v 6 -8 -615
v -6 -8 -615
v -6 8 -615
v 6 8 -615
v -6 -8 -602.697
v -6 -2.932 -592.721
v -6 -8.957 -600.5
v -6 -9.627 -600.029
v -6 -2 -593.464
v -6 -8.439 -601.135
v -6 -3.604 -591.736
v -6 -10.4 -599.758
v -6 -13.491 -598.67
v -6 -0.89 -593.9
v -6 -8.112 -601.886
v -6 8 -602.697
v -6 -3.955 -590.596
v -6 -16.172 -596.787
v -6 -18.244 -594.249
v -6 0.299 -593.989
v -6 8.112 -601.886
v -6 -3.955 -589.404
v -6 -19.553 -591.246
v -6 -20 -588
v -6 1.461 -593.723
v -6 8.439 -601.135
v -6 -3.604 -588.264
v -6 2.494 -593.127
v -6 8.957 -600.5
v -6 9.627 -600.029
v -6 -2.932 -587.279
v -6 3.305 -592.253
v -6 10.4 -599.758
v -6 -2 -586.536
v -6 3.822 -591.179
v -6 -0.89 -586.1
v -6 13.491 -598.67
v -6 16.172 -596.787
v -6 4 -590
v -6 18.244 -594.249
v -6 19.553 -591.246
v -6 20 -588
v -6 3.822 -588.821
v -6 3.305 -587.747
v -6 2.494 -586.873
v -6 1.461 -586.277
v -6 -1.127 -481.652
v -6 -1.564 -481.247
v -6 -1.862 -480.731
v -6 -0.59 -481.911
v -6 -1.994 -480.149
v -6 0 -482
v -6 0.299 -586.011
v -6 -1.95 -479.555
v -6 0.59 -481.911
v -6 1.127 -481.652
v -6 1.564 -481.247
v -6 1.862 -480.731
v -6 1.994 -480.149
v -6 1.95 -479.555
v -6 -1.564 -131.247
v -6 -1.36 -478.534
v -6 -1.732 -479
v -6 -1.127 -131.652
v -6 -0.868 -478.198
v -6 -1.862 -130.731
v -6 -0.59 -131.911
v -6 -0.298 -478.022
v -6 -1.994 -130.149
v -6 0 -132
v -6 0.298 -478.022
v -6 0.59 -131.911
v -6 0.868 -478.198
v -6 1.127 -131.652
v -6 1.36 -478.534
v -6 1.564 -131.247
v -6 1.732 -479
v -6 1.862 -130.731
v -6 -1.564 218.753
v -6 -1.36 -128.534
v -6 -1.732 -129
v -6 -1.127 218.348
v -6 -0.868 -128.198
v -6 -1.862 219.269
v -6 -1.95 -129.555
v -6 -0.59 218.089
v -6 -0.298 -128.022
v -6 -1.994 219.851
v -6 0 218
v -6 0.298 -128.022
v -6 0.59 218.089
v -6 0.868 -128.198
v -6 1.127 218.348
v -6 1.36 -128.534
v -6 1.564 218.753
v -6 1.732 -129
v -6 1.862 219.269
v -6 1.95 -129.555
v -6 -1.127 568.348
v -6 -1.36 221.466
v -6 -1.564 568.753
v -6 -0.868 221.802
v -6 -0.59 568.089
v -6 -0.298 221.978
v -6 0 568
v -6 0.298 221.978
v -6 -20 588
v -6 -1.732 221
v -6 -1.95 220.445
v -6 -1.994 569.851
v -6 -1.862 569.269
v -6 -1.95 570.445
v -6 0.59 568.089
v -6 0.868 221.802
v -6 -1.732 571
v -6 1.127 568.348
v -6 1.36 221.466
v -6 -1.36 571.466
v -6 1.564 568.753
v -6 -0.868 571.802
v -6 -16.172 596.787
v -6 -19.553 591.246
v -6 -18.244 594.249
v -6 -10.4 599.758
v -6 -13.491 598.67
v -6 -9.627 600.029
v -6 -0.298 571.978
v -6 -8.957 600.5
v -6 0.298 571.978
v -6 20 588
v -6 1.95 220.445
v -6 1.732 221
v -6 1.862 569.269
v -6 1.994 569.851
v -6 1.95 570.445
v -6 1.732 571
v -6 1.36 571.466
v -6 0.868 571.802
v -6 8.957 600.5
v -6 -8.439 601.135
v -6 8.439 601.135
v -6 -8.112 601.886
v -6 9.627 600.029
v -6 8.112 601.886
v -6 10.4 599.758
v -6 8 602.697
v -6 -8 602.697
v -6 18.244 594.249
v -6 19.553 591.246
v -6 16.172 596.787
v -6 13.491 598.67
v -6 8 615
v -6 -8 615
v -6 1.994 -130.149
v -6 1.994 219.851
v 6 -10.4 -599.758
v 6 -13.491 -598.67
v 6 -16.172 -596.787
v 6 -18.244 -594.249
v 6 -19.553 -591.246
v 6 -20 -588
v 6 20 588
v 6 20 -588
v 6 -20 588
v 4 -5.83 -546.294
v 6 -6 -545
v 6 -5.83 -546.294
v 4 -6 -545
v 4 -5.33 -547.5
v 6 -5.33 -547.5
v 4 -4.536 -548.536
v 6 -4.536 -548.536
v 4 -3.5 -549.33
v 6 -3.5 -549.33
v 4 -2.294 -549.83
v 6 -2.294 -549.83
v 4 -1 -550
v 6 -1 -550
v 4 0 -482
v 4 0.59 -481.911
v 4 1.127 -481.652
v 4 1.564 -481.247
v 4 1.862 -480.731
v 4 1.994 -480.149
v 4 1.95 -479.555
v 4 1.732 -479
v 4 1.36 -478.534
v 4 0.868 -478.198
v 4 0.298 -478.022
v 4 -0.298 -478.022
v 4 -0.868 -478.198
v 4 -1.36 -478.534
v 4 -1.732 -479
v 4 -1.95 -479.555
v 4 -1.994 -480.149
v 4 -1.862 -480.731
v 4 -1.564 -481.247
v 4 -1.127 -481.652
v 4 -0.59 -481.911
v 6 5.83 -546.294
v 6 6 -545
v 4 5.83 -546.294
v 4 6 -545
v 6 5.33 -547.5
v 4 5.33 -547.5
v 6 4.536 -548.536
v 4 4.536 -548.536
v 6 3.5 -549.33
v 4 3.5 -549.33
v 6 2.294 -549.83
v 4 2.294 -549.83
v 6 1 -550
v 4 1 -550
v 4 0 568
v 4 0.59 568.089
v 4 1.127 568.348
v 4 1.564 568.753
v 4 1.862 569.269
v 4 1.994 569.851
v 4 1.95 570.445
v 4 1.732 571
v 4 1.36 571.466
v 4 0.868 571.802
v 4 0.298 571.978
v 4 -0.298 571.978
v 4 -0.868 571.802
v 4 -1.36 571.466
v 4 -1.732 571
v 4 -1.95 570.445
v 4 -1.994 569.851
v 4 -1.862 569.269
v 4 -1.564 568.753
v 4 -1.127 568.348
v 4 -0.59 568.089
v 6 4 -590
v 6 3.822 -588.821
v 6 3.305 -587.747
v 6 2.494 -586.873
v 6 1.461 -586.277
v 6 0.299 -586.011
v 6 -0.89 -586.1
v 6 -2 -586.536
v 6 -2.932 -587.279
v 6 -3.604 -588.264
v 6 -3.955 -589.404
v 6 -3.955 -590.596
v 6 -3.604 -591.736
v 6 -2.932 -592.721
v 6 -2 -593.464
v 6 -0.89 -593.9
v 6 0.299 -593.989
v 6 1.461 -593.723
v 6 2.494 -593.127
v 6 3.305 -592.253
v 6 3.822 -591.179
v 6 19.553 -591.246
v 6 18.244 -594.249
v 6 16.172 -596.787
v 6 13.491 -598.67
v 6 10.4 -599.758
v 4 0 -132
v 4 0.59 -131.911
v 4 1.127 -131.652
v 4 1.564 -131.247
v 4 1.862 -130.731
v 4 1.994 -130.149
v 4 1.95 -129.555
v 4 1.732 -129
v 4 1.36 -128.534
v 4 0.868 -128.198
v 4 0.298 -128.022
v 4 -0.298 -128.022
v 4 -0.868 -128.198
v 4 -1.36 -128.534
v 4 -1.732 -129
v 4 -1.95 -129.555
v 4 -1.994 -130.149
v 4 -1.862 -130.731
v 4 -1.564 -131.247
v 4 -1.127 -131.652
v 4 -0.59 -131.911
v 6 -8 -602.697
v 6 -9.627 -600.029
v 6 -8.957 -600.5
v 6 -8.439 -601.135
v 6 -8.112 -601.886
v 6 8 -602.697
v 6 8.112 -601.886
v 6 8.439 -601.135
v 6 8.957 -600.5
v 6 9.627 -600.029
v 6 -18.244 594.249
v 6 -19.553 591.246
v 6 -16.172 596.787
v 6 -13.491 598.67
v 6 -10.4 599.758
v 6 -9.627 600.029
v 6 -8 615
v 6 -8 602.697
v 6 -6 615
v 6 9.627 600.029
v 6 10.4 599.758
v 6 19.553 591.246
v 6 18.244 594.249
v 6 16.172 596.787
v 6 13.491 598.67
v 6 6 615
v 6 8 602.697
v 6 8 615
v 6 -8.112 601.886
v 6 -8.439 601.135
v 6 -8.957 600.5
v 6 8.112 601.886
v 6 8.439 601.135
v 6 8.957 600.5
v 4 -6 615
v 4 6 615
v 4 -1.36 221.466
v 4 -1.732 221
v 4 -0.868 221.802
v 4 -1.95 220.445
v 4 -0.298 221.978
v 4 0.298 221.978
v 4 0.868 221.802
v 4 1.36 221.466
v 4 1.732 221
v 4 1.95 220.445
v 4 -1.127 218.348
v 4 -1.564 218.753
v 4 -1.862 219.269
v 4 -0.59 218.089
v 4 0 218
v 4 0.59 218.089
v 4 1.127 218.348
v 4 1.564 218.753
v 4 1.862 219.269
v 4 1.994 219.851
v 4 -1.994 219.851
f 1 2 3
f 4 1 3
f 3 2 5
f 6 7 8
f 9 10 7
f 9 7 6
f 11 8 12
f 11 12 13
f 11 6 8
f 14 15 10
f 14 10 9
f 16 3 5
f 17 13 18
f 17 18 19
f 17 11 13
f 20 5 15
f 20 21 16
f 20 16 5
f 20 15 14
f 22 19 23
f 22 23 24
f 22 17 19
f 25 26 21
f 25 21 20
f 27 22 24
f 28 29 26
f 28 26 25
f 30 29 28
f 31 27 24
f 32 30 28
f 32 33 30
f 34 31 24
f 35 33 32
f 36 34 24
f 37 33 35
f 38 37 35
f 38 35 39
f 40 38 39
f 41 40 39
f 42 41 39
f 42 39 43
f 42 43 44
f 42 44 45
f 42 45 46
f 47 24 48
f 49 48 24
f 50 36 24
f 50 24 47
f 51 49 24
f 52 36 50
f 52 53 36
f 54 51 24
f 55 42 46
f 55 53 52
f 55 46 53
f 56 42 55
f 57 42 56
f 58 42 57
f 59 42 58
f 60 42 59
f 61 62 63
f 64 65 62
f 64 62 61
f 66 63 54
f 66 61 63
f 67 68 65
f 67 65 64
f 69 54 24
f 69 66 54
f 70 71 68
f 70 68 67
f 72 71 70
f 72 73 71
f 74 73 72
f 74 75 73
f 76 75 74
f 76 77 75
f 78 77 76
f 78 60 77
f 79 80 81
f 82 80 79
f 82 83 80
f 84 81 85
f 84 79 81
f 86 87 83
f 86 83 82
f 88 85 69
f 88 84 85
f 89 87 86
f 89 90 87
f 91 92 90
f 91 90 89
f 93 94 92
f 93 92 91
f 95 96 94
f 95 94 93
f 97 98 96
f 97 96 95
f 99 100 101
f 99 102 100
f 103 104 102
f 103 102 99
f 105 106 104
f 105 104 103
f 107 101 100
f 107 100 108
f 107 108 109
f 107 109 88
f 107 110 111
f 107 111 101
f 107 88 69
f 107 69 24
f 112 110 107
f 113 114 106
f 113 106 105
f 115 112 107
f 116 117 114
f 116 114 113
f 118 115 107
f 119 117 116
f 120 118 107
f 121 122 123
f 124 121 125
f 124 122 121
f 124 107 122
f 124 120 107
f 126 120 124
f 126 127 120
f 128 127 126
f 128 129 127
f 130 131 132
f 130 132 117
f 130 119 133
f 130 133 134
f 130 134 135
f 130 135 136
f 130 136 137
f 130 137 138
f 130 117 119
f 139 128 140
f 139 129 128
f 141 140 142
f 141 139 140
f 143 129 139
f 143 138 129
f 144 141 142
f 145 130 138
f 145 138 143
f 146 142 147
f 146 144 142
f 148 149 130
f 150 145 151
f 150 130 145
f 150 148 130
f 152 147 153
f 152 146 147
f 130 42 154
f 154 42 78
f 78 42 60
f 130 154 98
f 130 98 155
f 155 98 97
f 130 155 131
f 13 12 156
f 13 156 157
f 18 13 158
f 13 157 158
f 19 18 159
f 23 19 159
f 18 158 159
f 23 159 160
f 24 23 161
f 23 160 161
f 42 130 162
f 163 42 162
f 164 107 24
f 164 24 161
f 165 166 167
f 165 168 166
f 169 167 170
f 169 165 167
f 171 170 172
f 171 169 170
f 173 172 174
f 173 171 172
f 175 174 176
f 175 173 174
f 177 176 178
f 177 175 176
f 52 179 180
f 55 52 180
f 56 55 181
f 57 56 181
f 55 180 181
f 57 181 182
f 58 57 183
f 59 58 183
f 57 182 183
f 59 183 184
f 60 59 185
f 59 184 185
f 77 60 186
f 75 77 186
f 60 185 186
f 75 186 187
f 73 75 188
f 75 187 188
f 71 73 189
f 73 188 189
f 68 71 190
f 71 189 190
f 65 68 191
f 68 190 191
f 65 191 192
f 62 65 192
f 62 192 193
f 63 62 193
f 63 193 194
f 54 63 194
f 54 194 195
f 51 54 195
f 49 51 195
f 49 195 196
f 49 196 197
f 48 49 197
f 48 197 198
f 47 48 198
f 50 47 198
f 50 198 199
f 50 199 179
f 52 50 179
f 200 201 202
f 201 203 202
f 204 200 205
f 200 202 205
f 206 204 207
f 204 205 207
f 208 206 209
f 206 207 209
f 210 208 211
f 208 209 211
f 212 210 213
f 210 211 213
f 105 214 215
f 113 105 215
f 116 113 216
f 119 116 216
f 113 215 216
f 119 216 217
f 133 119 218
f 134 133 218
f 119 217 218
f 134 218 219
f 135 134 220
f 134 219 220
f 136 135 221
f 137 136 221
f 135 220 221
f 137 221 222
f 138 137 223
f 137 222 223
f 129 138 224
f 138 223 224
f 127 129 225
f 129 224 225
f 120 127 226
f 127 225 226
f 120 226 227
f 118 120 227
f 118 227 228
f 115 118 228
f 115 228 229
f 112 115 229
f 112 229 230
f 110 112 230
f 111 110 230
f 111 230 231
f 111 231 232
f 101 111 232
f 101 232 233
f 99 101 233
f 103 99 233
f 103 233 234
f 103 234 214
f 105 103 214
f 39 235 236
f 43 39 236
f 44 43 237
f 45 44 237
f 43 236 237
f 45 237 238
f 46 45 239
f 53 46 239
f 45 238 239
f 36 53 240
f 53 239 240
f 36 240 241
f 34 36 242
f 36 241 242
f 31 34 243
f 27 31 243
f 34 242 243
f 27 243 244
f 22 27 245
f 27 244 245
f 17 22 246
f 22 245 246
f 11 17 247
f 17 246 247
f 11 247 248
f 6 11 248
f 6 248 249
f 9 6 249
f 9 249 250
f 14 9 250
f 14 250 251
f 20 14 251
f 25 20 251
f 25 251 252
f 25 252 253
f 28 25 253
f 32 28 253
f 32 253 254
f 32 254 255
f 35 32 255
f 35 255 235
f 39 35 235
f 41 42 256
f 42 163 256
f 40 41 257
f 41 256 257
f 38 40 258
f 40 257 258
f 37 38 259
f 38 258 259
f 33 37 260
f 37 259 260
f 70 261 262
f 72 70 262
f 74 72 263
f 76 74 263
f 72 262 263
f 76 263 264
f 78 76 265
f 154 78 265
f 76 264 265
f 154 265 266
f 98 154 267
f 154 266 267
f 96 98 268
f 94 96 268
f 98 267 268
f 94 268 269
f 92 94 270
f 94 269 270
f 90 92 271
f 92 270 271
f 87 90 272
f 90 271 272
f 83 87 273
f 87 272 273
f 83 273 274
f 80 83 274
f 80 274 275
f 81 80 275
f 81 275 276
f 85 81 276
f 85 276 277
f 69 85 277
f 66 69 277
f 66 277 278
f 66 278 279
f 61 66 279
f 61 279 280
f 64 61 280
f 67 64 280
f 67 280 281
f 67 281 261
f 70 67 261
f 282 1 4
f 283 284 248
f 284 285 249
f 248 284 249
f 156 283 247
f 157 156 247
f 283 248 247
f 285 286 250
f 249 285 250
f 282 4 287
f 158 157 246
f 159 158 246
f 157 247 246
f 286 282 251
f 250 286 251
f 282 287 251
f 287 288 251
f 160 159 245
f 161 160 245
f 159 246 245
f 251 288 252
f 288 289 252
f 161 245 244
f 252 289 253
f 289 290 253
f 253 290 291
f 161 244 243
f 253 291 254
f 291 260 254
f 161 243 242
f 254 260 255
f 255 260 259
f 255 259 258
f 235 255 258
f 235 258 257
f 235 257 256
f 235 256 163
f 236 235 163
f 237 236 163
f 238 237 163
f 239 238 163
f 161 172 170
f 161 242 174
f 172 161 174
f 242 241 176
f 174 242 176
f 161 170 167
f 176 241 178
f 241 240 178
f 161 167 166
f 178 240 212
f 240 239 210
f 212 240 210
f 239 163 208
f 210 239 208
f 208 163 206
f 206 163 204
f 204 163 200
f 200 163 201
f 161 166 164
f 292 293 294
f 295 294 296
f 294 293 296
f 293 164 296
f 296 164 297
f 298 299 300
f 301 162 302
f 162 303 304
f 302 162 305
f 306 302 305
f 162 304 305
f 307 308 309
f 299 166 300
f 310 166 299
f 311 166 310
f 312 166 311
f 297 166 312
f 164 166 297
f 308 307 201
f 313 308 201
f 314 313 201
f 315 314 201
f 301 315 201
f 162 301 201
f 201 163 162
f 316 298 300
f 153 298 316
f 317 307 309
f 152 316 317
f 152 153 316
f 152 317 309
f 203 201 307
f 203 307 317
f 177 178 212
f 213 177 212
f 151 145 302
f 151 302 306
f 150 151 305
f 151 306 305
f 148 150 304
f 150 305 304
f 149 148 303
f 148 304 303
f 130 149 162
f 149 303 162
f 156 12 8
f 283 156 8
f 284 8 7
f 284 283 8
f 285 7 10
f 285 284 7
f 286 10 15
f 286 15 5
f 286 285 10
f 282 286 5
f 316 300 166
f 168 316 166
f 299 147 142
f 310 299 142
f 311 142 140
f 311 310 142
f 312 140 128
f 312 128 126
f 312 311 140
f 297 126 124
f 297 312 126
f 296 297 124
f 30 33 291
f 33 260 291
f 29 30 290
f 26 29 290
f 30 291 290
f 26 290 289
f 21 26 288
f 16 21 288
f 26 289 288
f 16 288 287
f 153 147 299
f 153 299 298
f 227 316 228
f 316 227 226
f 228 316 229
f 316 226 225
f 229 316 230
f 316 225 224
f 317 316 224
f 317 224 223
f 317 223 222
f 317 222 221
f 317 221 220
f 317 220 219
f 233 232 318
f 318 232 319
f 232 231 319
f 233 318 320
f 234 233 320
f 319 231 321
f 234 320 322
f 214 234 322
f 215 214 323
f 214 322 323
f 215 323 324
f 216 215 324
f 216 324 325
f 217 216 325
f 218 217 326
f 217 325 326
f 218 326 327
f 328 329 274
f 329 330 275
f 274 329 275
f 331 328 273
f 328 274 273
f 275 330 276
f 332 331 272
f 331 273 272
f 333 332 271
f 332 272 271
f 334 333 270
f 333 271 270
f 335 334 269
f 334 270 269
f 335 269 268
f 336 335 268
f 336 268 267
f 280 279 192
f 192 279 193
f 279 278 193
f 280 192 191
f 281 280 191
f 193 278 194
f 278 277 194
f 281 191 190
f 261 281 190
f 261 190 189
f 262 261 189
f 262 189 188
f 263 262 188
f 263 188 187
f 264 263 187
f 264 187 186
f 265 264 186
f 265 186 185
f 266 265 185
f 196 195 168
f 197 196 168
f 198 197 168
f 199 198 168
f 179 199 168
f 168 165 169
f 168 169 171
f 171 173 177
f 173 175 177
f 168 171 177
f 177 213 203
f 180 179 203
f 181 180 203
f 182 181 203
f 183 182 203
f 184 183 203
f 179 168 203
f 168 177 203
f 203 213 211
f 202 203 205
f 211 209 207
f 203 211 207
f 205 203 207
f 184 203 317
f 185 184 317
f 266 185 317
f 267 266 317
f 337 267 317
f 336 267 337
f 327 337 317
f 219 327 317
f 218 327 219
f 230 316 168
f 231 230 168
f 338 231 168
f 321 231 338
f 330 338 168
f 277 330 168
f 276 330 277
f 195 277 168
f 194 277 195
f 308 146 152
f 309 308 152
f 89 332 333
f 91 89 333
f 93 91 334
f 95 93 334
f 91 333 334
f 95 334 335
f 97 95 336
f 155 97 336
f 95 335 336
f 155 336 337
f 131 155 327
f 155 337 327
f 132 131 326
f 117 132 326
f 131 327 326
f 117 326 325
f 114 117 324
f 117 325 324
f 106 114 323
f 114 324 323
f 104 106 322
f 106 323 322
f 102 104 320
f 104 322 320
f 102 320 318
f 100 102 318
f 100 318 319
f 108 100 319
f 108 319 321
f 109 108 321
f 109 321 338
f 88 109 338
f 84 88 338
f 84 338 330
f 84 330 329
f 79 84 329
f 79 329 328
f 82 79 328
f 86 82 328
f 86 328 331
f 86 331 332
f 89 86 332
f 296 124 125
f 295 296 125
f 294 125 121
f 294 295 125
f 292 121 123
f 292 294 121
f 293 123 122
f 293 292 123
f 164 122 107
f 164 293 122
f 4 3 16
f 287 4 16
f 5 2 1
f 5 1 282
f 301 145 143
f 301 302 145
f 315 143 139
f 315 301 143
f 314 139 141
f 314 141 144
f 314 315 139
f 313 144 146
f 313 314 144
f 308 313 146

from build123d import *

# Parameters (mm, degrees)
SKETCH1_W                    = 12
SKETCH1_H                    = 40
BOSS_EXTRUDE1_DEPTH          = 600
FILLET1_R                    = 12
SKETCH2_W                    = 1150
SKETCH2_H                    = 12
CUT_EXTRUDE1_DEPTH           = 2
FILLET2_R                    = 5
CUT_EXTRUDE2_REACH           = 14
SKETCH3_R                    = 4
F_4_0_4_DIAMETER_HOLE1_D     = 4
F_4_0_4_DIAMETER_HOLE1_DEPTH = 10
LPATTERN1_COUNT              = 4
LPATTERN1_PITCH              = 350
SKETCH6_W                    = 15
SKETCH6_H                    = 16
BOSS_EXTRUDE2_DEPTH          = 12
CUT_EXTRUDE6_REACH           = 17
SKETCH7_W                    = 2
SKETCH7_H                    = 12
FILLET3_R                    = 3


with BuildPart() as part:
    # Sketch1 → Boss-Extrude1 (new body, symmetric)
    with BuildSketch(Plane.XY):
        Rectangle(SKETCH1_W, SKETCH1_H)
    extrude(amount=BOSS_EXTRUDE1_DEPTH, both=True)

    # Fillet1
    fillet1_edges = [part.edges().sort_by_distance(p)[0] for p in [
        (0, -20, 600),
        (0, -20, -600),
        (0, 20, -600),
        (0, 20, 600),
    ]]
    fillet(fillet1_edges, radius=FILLET1_R)

    # Sketch2 → Cut-Extrude1 (cut)
    with BuildSketch(Plane(origin=(6, 0, 0), x_dir=(0, 0, -1), z_dir=(1, 0, 0))):
        with Locations((-25, 0)):
            Rectangle(SKETCH2_W, SKETCH2_H)
    extrude(amount=-CUT_EXTRUDE1_DEPTH, mode=Mode.SUBTRACT)

    # Fillet2
    fillet2_edges = [part.edges().sort_by_distance(p)[0] for p in [
        (5, 6, -550),
        (5, -6, -550),
    ]]
    fillet(fillet2_edges, radius=FILLET2_R)

    # Sketch3 → Cut-Extrude2 (cut, up to next)
    with BuildSketch(Plane(origin=(6, 0, 0), x_dir=(0, 0, -1), z_dir=(1, 0, 0)), mode=Mode.PRIVATE) as cut_extrude2_sk1:
        with Locations(Location((590, 0, 0), (0, 0, 90))):  # turned: the seam where the file's is
            Circle(SKETCH3_R)
    cut_extrude2_tool1 = extrude(cut_extrude2_sk1.sketch, amount=-CUT_EXTRUDE2_REACH, mode=Mode.PRIVATE) & part.part
    add(cut_extrude2_tool1.solids().sort_by_distance((6, 0, -590))[0], mode=Mode.SUBTRACT)

    # Ø4.0 (4) Diameter Hole1
    with Locations(Plane.ZY.offset(6)):
        with Locations((570, 0)):
            f_4_0_4_diameter_hole1 = Hole(F_4_0_4_DIAMETER_HOLE1_D / 2, depth=F_4_0_4_DIAMETER_HOLE1_DEPTH)

    # LPattern1: Ø4.0 (4) Diameter Hole1 ×4
    with Locations(*[(0, 0, -i * LPATTERN1_PITCH) for i in range(1, LPATTERN1_COUNT)]):
        add(f_4_0_4_diameter_hole1, mode=Mode.SUBTRACT)

    # Sketch6 → Boss-Extrude2 (add)
    with BuildSketch(Plane.ZY.offset(6)):
        with Locations((-607.5, 0)):
            Rectangle(SKETCH6_W, SKETCH6_H)
        with Locations((607.5, 0)):
            Rectangle(SKETCH6_W, SKETCH6_H)
    extrude(amount=-BOSS_EXTRUDE2_DEPTH)

    # Sketch7 → Cut-Extrude6 (cut, up to next)
    with BuildSketch(Plane(origin=(0, 0, 600), x_dir=(-1, 0, 0), z_dir=(0, 0, -1)), mode=Mode.PRIVATE) as cut_extrude6_sk1:
        with Locations((-5, 0)):
            Rectangle(SKETCH7_W, SKETCH7_H)
    cut_extrude6_tool1 = extrude(cut_extrude6_sk1.sketch, amount=-CUT_EXTRUDE6_REACH, mode=Mode.PRIVATE) & part.part
    add(cut_extrude6_tool1.solids().sort_by_distance((5, 0, 600))[0], mode=Mode.SUBTRACT)

    # Fillet3
    fillet3_edges = [part.edges().sort_by_distance(p)[0] for p in [
        (0, -8, 600),
        (0, 8, 600),
        (0, -8, -600),
        (0, 8, -600),
    ]]
    fillet(fillet3_edges, radius=FILLET3_R)


solid = part.part
